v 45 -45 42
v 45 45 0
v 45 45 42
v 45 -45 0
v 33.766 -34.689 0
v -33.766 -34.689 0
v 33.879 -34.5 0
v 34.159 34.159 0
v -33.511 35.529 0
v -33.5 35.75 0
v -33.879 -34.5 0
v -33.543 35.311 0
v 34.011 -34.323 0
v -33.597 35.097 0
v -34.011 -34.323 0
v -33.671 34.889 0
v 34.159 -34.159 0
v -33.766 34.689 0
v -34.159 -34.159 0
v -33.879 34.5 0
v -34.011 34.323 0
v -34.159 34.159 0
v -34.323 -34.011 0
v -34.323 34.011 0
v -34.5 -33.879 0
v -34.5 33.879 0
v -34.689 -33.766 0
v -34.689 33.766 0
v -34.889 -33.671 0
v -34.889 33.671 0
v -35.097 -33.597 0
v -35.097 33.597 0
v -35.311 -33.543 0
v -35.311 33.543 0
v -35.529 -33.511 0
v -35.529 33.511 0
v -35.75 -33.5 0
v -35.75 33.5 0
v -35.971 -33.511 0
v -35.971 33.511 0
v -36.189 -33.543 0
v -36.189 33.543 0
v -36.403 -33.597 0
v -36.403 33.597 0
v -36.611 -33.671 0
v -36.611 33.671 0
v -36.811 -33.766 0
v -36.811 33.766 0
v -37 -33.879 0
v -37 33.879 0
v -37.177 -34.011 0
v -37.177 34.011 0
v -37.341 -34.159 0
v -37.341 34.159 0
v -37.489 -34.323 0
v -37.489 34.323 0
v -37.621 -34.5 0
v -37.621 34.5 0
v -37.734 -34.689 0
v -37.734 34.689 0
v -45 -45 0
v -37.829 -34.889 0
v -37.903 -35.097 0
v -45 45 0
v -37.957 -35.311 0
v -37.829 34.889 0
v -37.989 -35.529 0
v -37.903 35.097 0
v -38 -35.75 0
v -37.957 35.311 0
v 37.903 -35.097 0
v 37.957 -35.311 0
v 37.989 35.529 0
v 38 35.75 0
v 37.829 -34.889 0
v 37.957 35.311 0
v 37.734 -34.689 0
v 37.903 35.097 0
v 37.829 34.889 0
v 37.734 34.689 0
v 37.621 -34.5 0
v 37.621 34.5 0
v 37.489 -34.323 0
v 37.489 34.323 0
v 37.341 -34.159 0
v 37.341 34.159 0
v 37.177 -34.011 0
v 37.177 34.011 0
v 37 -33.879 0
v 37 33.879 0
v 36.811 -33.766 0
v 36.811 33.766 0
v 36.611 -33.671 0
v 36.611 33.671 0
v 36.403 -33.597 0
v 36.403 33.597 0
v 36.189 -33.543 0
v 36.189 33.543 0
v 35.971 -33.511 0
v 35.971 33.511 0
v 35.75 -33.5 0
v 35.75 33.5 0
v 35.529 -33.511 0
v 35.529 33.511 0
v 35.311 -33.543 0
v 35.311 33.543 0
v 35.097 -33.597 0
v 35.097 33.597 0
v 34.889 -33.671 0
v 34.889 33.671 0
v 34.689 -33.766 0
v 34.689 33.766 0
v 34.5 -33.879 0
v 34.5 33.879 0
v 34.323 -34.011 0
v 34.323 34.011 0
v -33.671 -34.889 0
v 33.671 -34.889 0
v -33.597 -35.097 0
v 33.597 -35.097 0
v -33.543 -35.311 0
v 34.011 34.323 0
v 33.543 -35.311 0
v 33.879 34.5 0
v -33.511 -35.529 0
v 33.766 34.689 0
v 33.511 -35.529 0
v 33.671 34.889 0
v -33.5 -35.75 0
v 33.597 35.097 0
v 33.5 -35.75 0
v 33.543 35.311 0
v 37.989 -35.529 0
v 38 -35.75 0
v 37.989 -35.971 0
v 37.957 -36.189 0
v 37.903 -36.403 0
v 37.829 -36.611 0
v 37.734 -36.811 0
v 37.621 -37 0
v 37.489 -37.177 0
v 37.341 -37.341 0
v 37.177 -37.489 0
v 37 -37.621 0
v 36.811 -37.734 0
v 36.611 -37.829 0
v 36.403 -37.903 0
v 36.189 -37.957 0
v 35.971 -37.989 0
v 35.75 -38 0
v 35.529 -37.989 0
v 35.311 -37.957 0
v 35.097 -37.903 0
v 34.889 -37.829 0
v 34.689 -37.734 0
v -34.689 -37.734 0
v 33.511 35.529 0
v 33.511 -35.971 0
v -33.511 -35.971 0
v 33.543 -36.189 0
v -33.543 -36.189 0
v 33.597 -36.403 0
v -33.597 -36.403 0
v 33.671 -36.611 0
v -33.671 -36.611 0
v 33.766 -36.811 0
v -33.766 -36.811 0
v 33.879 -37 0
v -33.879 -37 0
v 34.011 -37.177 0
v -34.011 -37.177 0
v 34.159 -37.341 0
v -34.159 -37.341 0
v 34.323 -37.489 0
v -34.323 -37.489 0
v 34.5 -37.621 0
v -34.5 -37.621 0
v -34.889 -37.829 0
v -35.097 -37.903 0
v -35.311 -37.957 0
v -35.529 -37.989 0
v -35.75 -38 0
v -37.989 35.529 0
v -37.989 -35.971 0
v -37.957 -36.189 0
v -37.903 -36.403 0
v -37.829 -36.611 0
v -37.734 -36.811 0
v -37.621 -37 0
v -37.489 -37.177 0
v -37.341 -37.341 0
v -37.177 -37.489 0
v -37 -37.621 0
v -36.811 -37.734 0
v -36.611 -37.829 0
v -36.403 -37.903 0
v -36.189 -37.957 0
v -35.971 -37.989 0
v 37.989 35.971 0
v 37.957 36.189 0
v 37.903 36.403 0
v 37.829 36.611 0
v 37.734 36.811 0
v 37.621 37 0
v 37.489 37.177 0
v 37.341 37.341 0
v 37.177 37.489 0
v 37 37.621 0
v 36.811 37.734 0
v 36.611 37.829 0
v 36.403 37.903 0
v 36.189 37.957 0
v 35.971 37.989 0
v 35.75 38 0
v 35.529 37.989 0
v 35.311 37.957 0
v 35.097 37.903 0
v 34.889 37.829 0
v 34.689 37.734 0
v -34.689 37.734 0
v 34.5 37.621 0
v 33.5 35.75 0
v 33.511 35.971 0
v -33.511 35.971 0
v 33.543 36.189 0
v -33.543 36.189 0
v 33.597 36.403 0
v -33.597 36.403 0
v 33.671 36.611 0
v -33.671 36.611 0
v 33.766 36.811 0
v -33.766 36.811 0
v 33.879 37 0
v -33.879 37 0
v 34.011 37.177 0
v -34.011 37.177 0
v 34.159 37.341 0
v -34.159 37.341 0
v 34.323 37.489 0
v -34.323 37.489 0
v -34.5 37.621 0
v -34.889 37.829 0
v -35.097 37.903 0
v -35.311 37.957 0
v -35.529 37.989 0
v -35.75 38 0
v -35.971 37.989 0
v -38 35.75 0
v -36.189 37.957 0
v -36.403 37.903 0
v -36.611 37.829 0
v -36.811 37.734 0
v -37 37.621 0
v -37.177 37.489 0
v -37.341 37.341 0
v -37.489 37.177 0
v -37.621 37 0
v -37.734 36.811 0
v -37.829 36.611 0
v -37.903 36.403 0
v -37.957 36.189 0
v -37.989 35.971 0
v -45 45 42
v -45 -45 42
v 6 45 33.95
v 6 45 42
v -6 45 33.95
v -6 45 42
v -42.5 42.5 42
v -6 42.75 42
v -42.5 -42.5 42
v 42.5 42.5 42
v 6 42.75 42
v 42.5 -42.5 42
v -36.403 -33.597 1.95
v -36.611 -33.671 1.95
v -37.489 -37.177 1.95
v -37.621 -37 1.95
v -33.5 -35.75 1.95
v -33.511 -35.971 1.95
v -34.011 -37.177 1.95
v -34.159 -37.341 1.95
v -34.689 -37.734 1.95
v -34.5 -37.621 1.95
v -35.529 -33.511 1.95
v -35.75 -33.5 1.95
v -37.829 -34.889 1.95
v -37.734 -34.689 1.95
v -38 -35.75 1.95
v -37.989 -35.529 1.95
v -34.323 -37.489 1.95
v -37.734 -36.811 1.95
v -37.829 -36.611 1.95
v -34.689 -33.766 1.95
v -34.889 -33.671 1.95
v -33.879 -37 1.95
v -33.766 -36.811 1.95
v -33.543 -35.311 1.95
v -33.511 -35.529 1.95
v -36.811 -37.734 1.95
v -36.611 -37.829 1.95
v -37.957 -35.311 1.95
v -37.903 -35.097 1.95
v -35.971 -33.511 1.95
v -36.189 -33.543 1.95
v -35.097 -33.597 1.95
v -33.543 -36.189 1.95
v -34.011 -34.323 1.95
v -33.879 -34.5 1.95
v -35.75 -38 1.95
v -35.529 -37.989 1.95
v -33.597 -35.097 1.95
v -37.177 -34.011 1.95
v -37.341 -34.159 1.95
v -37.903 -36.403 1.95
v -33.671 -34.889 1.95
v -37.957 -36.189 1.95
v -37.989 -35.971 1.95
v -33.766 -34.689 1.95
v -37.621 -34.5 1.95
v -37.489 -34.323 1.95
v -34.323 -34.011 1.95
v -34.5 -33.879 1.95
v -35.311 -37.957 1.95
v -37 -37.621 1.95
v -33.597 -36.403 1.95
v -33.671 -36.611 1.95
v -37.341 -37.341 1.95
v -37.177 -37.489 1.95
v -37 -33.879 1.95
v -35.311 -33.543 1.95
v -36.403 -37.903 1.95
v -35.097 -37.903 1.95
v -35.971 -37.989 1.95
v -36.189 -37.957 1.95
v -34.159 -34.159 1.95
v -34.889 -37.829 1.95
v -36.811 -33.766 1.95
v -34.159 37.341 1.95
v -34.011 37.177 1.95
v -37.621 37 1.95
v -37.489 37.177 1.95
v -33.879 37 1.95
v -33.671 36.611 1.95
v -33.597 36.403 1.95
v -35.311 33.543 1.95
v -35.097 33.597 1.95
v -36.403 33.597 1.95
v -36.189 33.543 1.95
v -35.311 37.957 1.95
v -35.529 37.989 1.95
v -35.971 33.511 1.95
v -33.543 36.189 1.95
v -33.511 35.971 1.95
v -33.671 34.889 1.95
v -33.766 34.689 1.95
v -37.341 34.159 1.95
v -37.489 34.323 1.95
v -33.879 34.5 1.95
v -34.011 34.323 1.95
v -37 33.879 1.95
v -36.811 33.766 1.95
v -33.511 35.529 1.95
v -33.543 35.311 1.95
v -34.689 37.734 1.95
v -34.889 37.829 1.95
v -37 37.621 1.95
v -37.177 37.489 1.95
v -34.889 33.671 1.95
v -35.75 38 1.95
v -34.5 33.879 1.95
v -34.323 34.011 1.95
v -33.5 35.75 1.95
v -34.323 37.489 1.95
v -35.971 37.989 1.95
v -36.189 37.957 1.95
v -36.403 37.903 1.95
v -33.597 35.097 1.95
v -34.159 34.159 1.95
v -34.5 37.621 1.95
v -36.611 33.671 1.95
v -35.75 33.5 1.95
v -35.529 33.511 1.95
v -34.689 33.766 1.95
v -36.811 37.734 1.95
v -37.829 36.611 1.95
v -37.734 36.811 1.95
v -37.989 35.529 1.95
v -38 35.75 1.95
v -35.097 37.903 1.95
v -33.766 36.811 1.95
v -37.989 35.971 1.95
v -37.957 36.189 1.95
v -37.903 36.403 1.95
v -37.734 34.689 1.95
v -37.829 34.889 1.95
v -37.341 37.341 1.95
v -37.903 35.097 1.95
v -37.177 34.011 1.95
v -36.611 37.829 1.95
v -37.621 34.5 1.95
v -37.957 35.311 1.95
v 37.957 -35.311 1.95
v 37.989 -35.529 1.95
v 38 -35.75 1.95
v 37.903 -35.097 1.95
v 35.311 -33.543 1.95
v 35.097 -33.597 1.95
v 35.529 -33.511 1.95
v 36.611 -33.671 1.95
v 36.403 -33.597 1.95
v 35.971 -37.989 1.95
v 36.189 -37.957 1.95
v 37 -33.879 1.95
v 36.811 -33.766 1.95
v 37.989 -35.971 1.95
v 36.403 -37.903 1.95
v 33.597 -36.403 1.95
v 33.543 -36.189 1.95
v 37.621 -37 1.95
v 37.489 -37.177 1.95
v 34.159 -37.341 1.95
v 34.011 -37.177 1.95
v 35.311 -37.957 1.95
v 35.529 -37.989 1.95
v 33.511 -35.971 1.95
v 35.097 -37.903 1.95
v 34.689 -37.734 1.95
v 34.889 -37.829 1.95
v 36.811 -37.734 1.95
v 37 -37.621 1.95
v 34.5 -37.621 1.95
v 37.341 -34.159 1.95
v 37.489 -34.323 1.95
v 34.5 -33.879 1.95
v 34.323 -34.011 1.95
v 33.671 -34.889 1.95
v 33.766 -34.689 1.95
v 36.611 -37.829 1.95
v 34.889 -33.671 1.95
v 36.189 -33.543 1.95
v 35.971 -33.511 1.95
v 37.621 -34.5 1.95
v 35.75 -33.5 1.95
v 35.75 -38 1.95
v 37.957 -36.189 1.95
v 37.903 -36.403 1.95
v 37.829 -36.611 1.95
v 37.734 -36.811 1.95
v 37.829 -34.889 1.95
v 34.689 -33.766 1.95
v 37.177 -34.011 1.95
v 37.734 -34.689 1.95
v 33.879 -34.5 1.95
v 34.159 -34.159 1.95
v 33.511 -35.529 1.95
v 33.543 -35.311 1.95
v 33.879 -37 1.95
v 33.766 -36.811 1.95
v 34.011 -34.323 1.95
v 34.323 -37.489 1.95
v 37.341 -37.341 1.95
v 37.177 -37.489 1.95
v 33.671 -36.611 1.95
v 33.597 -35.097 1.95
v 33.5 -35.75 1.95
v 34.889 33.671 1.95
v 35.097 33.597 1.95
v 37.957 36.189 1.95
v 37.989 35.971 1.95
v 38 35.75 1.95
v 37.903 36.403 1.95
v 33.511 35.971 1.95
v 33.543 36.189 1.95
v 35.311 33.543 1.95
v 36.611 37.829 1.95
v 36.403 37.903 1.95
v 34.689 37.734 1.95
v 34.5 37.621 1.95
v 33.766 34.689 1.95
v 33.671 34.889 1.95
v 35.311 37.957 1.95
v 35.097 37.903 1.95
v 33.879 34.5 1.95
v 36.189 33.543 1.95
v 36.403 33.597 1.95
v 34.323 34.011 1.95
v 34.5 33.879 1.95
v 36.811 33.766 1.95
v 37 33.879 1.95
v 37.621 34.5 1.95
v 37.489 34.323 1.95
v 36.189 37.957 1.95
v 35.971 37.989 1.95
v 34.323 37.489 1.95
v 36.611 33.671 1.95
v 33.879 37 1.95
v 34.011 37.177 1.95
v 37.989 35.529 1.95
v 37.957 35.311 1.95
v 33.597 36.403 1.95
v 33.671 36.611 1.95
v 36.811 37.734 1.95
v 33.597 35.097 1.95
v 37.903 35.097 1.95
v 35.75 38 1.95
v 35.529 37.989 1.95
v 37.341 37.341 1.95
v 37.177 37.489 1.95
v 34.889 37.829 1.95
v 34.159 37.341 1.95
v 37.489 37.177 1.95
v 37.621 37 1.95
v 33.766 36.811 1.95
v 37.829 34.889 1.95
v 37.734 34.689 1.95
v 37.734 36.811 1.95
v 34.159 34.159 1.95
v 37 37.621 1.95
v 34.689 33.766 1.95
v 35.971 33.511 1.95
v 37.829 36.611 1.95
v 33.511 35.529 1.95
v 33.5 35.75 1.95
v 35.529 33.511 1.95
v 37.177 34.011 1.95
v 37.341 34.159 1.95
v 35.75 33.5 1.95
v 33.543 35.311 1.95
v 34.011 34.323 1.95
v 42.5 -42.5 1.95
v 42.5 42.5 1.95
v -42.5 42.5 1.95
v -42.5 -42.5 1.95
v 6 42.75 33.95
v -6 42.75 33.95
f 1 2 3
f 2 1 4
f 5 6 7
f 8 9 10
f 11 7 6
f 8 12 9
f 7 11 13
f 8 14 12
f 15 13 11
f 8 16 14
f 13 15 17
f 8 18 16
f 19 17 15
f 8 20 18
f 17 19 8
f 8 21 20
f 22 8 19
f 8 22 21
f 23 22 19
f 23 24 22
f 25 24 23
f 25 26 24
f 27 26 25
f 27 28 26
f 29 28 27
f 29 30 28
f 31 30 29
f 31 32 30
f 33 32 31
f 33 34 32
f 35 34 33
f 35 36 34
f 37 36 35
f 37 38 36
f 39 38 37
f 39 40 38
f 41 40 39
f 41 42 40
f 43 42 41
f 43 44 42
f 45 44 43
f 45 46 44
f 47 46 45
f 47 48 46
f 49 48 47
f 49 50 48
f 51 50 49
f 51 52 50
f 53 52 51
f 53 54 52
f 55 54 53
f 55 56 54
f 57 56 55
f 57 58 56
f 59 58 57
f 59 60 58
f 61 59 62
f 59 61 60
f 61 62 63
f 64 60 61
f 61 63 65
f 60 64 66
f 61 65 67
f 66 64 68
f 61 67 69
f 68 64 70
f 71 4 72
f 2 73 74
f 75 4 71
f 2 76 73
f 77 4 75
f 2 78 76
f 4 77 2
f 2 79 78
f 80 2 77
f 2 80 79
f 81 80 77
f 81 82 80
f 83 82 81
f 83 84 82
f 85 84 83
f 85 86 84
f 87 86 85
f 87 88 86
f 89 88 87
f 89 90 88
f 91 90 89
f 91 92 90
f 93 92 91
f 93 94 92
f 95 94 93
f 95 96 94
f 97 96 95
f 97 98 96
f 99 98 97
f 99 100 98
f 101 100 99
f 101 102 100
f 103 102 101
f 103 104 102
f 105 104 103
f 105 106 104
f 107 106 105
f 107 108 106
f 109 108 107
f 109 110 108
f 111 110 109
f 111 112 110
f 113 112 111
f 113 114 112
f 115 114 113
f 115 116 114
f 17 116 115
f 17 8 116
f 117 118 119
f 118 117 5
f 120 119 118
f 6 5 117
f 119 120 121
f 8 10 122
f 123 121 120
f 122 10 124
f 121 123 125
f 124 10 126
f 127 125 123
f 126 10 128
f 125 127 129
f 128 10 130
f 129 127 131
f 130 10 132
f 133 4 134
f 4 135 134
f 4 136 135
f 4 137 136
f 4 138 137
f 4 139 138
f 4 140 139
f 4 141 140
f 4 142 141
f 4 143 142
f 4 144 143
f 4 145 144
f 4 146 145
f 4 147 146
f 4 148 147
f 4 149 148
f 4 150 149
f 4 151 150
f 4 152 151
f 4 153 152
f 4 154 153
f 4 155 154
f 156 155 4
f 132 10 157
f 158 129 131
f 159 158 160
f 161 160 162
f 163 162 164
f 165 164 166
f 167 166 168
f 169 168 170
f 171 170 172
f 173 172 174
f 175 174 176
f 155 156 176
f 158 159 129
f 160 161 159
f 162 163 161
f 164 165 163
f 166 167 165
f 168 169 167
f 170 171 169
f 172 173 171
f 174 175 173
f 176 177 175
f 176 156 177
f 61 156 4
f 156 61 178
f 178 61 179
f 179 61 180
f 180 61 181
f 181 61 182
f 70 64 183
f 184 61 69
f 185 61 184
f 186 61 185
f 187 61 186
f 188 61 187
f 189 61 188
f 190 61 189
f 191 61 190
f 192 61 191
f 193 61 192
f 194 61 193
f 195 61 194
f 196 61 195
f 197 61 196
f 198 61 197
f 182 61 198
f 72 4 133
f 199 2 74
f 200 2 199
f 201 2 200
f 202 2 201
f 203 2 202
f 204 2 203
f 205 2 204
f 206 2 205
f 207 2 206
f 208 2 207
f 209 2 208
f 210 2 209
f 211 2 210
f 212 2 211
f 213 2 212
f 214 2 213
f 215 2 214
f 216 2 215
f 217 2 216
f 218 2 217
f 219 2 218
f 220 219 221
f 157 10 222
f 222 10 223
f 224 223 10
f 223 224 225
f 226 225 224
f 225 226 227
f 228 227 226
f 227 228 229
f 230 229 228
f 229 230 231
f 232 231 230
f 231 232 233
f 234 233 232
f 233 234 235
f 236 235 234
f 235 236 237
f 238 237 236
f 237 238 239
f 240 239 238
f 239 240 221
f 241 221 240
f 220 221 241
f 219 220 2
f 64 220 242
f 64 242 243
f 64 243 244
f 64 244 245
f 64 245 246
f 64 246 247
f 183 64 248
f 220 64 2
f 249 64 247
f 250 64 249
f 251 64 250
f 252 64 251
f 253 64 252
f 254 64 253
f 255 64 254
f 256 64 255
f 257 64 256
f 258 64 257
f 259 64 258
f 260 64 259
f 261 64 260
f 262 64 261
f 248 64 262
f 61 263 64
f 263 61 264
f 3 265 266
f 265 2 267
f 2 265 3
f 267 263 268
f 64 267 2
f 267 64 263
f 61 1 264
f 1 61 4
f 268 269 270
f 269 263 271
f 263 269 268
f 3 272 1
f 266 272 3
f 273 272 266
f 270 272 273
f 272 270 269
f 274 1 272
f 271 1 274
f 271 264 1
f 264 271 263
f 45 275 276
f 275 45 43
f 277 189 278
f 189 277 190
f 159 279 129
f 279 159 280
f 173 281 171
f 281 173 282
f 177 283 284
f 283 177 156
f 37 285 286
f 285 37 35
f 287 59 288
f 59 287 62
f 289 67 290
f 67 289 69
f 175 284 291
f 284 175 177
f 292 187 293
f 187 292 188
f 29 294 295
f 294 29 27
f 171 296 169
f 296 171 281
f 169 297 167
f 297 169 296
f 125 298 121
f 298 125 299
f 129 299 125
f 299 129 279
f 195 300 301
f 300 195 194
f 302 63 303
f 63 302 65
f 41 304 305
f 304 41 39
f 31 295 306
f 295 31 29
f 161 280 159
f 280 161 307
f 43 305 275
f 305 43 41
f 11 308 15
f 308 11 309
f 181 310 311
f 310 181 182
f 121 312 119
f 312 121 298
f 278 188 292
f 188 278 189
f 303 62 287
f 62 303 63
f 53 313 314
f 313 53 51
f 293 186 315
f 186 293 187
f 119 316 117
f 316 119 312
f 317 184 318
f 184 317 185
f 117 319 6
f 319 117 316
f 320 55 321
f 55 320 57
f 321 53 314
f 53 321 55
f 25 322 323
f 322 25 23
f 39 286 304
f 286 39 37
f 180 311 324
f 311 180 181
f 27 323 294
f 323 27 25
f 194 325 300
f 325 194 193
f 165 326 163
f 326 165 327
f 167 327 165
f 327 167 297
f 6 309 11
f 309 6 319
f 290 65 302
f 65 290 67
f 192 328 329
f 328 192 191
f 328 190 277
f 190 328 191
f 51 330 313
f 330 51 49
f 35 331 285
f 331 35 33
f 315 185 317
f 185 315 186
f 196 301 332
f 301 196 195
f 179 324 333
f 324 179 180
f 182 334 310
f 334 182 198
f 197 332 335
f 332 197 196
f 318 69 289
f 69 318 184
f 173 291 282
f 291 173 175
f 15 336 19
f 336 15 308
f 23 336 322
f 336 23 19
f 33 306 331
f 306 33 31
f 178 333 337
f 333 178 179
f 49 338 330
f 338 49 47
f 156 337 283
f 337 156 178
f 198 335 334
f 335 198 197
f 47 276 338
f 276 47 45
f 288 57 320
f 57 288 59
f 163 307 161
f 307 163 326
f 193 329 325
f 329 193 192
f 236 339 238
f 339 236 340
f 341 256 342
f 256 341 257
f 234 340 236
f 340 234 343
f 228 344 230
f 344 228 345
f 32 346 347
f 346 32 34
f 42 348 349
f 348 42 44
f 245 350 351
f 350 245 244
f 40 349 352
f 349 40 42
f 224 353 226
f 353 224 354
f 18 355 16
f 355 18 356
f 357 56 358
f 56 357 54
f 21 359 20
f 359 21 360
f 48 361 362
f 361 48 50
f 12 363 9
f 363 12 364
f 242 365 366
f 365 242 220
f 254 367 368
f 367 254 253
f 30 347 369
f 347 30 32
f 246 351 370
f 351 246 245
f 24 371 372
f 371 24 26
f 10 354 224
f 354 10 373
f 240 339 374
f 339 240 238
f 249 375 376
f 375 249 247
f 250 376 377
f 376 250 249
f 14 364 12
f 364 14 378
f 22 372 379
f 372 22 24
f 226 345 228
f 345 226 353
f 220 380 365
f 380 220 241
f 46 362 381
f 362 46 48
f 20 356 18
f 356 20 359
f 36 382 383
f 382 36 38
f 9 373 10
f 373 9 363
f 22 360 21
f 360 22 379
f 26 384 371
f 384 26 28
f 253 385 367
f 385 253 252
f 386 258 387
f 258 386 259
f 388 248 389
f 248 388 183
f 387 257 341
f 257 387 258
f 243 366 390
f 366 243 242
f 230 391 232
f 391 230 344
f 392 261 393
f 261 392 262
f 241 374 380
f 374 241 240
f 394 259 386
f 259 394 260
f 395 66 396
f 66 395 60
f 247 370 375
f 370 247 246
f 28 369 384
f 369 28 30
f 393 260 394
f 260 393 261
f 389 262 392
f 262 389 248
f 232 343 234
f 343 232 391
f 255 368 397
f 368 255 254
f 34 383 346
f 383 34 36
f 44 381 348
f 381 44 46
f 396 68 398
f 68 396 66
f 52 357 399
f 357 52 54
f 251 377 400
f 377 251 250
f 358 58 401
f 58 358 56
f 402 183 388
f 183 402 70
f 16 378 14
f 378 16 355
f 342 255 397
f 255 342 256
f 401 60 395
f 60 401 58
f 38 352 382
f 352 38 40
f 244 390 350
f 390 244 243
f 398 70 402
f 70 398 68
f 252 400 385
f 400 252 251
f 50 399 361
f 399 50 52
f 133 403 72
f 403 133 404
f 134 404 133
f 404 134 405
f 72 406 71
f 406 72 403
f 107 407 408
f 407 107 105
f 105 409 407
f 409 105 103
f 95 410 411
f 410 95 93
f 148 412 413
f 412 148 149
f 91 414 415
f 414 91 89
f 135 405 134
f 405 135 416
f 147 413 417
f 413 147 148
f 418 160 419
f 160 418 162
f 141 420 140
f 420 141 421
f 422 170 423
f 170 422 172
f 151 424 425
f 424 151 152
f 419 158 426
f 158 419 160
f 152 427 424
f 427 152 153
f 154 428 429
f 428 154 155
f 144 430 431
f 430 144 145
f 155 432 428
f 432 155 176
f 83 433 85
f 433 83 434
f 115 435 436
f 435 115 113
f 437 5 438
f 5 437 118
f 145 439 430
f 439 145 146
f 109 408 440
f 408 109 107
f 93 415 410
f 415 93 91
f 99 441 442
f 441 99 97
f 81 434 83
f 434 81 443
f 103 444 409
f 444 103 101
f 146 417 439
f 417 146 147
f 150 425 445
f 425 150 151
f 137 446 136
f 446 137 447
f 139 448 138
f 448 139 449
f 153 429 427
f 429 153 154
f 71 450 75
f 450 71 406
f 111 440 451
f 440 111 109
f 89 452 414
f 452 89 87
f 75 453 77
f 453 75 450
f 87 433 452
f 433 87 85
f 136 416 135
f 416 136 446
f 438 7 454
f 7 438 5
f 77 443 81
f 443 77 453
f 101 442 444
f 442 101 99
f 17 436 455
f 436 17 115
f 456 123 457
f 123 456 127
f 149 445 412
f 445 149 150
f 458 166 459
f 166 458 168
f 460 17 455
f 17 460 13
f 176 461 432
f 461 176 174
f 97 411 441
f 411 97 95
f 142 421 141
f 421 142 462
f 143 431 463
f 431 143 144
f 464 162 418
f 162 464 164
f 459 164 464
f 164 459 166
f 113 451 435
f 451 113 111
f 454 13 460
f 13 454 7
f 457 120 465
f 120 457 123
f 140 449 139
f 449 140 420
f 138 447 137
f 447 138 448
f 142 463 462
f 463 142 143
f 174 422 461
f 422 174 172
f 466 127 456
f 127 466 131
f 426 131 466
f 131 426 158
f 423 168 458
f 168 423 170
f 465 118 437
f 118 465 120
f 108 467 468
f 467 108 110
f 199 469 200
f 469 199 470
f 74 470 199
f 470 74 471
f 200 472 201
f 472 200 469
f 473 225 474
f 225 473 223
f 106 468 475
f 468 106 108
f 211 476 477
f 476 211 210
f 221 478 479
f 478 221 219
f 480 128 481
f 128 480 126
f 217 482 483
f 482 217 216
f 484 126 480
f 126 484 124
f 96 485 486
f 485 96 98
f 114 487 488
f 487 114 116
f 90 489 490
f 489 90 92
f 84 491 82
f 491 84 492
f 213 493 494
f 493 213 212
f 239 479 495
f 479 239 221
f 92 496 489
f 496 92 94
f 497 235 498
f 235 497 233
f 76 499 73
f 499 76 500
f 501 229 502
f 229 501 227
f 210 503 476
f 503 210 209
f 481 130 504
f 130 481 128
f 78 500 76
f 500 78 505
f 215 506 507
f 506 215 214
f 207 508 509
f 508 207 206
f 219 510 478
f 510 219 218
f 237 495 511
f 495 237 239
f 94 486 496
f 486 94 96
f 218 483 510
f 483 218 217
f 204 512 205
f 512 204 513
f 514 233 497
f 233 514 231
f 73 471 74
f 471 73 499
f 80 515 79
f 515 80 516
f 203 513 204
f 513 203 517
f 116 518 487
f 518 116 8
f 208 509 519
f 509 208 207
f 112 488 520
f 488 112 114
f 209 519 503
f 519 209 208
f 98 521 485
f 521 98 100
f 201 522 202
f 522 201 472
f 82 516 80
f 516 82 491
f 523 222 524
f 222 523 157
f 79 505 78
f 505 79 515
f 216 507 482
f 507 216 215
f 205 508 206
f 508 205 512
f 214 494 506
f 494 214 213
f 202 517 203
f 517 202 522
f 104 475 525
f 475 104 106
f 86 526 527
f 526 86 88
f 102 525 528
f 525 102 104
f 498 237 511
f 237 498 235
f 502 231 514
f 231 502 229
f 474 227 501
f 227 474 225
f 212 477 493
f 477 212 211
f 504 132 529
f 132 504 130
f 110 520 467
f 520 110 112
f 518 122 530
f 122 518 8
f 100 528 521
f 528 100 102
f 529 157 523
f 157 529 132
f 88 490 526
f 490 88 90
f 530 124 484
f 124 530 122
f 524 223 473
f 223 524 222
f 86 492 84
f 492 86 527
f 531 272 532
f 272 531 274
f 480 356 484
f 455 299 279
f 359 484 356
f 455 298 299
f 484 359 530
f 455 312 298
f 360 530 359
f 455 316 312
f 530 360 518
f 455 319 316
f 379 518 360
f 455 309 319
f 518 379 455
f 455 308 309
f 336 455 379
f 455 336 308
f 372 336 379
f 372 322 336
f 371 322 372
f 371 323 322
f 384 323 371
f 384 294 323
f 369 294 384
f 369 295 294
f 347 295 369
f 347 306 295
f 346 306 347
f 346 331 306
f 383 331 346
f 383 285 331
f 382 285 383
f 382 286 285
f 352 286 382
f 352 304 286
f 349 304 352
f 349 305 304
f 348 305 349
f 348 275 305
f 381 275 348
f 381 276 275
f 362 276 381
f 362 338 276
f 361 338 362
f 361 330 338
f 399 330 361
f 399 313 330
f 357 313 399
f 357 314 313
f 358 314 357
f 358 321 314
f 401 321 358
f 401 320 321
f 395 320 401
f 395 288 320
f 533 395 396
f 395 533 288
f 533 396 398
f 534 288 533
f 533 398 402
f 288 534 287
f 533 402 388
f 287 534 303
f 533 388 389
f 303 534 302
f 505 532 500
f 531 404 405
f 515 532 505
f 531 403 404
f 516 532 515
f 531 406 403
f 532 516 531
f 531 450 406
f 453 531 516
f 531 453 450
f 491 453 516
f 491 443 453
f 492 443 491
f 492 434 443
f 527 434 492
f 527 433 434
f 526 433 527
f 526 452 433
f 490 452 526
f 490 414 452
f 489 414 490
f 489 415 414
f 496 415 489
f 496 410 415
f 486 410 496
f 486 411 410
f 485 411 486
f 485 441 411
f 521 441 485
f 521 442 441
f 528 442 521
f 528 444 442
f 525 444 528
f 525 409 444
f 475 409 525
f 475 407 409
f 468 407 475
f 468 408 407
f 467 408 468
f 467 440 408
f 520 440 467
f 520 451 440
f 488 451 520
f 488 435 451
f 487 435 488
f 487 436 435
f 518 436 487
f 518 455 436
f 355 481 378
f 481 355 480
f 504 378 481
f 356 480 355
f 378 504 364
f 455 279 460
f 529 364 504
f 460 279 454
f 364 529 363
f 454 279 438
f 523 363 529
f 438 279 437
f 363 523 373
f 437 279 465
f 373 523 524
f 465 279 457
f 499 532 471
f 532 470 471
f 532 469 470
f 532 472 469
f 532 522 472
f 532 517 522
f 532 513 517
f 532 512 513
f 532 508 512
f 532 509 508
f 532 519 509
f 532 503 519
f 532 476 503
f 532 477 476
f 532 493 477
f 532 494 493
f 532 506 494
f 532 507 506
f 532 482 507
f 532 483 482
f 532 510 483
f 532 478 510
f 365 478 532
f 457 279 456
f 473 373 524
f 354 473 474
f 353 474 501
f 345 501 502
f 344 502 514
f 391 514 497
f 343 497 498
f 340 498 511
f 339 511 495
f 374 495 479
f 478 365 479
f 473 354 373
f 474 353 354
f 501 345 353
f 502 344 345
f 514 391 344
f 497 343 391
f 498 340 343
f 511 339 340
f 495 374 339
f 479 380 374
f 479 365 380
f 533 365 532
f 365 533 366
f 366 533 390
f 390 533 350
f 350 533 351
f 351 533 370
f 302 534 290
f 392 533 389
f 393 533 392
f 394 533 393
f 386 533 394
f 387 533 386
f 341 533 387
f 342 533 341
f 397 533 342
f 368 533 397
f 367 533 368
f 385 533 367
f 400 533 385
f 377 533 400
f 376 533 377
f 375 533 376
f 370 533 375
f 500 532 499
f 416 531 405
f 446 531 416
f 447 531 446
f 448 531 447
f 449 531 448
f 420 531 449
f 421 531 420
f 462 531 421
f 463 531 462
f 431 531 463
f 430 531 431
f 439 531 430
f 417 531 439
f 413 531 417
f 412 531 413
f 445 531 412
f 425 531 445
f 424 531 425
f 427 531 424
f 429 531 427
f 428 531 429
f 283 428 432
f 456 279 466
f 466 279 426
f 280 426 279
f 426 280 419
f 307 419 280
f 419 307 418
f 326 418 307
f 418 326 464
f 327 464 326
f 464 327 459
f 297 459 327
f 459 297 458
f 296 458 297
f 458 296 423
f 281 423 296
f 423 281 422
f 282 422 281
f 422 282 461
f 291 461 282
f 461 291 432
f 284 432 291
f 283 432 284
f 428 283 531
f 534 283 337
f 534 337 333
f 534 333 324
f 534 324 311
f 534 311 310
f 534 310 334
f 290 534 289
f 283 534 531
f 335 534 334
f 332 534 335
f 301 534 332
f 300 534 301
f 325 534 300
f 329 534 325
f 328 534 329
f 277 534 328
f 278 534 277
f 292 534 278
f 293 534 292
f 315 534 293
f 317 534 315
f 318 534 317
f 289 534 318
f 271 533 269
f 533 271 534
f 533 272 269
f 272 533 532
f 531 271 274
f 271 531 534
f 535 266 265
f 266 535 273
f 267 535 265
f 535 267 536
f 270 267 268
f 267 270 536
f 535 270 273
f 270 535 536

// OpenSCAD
// --- Dimensions (mm) ---
outer_width = 90;          // Outer dimension of the square box (X)
outer_length = 90;         // Outer dimension of the square box (Y)
wall_thickness = 2.5;      // Thickness of the four vertical walls
top_plate_thickness = 2;   // Thickness of the top plate (the stirring surface)
total_wall_height = 40;    // Height of the walls rising from the plate
screw_hole_diameter = 4.5; // Diameter for M4 screw holes
screw_pattern_size = 71.5; // Distance between screw hole centers
notch_width = 12;          // Width of the cable notch
notch_depth = 8;           // Depth of the notch from the open edge
$fn = 64;                  // Smoothness for circular features

// --- Implementation ---
// The part is printed upside down.
// The top plate (stirring surface) lies on the bed (z = 0 to 2).
// The walls rise from the plate to z = 42 (2 + 40).

// We use a single difference() to ensure a single watertight solid.
difference() {
    // 1. The Main Body (Plate + Walls)
    union() {
        // The Top Plate (Base of the box in print orientation)
        // Positioned at Z = 0 to Z = 2
        // We translate by +1 so the bottom is at Z=0 and top is at Z=2
        translate([0, 0, top_plate_thickness / 2])
            cube([outer_width, outer_length, top_plate_thickness], center = true);
        
        // The Four Walls
        // They start at the top of the plate (Z = 2) and rise 40mm (to Z = 42)
        // The center of the wall block is at Z = 2 + (40/2) = 22
        translate([0, 0, top_plate_thickness + (total_wall_height / 2)])
            cube([outer_width, outer_length, total_wall_height], center = true);
    }

    // 2. Subtracting the Interior (Hollowing out the box)
    // The interior starts from the top of the plate (Z=2) up to the top (Z=42)
    // We use a slightly taller cube to ensure a clean cut through the top edge.
    translate([0, 0, top_plate_thickness + (total_wall_height / 2)])
        cube([outer_width - 2 * wall_thickness, outer_length - 2 * wall_thickness, total_wall_height + 0.1], center = true);

    // 3. Screw Holes (M4)
    // Drilled through the top plate (Z = 0 to 2)
    for (x = [-1, 1], y = [-1, 1]) {
        translate([x * screw_pattern_size / 2, y * screw_pattern_size / 2, -1])
            cylinder(d = screw_hole_diameter, h = top_plate_thickness + 2);
    }

    // 4. Cable Notch
    // Located in one wall, centered along the wall.
    // Reaches 8mm down from the open edge (z = 42 down to z = 34).
    // The notch is 12mm wide (X).
    // We place it on the wall at Y = outer_length/2.
    // The notch is a cutout from the outer boundary.
    // The notch spans Z from (42 - 8) to 42.
    // We use a cube that is wider than the wall to ensure a clean cut through the wall.
    translate([0, outer_length / 2, top_plate_thickness + total_wall_height - (notch_depth / 2)])
        cube([notch_width, wall_thickness + 2, notch_depth + 0.1], center = true);
}

// Final check of Z-coordinates:
// Plate: Z = 0 to 2.
// Walls: Z = 2 to 42.
// Notch: Z = 34 to 42.
// Screw holes: Z = 0 to 2.
